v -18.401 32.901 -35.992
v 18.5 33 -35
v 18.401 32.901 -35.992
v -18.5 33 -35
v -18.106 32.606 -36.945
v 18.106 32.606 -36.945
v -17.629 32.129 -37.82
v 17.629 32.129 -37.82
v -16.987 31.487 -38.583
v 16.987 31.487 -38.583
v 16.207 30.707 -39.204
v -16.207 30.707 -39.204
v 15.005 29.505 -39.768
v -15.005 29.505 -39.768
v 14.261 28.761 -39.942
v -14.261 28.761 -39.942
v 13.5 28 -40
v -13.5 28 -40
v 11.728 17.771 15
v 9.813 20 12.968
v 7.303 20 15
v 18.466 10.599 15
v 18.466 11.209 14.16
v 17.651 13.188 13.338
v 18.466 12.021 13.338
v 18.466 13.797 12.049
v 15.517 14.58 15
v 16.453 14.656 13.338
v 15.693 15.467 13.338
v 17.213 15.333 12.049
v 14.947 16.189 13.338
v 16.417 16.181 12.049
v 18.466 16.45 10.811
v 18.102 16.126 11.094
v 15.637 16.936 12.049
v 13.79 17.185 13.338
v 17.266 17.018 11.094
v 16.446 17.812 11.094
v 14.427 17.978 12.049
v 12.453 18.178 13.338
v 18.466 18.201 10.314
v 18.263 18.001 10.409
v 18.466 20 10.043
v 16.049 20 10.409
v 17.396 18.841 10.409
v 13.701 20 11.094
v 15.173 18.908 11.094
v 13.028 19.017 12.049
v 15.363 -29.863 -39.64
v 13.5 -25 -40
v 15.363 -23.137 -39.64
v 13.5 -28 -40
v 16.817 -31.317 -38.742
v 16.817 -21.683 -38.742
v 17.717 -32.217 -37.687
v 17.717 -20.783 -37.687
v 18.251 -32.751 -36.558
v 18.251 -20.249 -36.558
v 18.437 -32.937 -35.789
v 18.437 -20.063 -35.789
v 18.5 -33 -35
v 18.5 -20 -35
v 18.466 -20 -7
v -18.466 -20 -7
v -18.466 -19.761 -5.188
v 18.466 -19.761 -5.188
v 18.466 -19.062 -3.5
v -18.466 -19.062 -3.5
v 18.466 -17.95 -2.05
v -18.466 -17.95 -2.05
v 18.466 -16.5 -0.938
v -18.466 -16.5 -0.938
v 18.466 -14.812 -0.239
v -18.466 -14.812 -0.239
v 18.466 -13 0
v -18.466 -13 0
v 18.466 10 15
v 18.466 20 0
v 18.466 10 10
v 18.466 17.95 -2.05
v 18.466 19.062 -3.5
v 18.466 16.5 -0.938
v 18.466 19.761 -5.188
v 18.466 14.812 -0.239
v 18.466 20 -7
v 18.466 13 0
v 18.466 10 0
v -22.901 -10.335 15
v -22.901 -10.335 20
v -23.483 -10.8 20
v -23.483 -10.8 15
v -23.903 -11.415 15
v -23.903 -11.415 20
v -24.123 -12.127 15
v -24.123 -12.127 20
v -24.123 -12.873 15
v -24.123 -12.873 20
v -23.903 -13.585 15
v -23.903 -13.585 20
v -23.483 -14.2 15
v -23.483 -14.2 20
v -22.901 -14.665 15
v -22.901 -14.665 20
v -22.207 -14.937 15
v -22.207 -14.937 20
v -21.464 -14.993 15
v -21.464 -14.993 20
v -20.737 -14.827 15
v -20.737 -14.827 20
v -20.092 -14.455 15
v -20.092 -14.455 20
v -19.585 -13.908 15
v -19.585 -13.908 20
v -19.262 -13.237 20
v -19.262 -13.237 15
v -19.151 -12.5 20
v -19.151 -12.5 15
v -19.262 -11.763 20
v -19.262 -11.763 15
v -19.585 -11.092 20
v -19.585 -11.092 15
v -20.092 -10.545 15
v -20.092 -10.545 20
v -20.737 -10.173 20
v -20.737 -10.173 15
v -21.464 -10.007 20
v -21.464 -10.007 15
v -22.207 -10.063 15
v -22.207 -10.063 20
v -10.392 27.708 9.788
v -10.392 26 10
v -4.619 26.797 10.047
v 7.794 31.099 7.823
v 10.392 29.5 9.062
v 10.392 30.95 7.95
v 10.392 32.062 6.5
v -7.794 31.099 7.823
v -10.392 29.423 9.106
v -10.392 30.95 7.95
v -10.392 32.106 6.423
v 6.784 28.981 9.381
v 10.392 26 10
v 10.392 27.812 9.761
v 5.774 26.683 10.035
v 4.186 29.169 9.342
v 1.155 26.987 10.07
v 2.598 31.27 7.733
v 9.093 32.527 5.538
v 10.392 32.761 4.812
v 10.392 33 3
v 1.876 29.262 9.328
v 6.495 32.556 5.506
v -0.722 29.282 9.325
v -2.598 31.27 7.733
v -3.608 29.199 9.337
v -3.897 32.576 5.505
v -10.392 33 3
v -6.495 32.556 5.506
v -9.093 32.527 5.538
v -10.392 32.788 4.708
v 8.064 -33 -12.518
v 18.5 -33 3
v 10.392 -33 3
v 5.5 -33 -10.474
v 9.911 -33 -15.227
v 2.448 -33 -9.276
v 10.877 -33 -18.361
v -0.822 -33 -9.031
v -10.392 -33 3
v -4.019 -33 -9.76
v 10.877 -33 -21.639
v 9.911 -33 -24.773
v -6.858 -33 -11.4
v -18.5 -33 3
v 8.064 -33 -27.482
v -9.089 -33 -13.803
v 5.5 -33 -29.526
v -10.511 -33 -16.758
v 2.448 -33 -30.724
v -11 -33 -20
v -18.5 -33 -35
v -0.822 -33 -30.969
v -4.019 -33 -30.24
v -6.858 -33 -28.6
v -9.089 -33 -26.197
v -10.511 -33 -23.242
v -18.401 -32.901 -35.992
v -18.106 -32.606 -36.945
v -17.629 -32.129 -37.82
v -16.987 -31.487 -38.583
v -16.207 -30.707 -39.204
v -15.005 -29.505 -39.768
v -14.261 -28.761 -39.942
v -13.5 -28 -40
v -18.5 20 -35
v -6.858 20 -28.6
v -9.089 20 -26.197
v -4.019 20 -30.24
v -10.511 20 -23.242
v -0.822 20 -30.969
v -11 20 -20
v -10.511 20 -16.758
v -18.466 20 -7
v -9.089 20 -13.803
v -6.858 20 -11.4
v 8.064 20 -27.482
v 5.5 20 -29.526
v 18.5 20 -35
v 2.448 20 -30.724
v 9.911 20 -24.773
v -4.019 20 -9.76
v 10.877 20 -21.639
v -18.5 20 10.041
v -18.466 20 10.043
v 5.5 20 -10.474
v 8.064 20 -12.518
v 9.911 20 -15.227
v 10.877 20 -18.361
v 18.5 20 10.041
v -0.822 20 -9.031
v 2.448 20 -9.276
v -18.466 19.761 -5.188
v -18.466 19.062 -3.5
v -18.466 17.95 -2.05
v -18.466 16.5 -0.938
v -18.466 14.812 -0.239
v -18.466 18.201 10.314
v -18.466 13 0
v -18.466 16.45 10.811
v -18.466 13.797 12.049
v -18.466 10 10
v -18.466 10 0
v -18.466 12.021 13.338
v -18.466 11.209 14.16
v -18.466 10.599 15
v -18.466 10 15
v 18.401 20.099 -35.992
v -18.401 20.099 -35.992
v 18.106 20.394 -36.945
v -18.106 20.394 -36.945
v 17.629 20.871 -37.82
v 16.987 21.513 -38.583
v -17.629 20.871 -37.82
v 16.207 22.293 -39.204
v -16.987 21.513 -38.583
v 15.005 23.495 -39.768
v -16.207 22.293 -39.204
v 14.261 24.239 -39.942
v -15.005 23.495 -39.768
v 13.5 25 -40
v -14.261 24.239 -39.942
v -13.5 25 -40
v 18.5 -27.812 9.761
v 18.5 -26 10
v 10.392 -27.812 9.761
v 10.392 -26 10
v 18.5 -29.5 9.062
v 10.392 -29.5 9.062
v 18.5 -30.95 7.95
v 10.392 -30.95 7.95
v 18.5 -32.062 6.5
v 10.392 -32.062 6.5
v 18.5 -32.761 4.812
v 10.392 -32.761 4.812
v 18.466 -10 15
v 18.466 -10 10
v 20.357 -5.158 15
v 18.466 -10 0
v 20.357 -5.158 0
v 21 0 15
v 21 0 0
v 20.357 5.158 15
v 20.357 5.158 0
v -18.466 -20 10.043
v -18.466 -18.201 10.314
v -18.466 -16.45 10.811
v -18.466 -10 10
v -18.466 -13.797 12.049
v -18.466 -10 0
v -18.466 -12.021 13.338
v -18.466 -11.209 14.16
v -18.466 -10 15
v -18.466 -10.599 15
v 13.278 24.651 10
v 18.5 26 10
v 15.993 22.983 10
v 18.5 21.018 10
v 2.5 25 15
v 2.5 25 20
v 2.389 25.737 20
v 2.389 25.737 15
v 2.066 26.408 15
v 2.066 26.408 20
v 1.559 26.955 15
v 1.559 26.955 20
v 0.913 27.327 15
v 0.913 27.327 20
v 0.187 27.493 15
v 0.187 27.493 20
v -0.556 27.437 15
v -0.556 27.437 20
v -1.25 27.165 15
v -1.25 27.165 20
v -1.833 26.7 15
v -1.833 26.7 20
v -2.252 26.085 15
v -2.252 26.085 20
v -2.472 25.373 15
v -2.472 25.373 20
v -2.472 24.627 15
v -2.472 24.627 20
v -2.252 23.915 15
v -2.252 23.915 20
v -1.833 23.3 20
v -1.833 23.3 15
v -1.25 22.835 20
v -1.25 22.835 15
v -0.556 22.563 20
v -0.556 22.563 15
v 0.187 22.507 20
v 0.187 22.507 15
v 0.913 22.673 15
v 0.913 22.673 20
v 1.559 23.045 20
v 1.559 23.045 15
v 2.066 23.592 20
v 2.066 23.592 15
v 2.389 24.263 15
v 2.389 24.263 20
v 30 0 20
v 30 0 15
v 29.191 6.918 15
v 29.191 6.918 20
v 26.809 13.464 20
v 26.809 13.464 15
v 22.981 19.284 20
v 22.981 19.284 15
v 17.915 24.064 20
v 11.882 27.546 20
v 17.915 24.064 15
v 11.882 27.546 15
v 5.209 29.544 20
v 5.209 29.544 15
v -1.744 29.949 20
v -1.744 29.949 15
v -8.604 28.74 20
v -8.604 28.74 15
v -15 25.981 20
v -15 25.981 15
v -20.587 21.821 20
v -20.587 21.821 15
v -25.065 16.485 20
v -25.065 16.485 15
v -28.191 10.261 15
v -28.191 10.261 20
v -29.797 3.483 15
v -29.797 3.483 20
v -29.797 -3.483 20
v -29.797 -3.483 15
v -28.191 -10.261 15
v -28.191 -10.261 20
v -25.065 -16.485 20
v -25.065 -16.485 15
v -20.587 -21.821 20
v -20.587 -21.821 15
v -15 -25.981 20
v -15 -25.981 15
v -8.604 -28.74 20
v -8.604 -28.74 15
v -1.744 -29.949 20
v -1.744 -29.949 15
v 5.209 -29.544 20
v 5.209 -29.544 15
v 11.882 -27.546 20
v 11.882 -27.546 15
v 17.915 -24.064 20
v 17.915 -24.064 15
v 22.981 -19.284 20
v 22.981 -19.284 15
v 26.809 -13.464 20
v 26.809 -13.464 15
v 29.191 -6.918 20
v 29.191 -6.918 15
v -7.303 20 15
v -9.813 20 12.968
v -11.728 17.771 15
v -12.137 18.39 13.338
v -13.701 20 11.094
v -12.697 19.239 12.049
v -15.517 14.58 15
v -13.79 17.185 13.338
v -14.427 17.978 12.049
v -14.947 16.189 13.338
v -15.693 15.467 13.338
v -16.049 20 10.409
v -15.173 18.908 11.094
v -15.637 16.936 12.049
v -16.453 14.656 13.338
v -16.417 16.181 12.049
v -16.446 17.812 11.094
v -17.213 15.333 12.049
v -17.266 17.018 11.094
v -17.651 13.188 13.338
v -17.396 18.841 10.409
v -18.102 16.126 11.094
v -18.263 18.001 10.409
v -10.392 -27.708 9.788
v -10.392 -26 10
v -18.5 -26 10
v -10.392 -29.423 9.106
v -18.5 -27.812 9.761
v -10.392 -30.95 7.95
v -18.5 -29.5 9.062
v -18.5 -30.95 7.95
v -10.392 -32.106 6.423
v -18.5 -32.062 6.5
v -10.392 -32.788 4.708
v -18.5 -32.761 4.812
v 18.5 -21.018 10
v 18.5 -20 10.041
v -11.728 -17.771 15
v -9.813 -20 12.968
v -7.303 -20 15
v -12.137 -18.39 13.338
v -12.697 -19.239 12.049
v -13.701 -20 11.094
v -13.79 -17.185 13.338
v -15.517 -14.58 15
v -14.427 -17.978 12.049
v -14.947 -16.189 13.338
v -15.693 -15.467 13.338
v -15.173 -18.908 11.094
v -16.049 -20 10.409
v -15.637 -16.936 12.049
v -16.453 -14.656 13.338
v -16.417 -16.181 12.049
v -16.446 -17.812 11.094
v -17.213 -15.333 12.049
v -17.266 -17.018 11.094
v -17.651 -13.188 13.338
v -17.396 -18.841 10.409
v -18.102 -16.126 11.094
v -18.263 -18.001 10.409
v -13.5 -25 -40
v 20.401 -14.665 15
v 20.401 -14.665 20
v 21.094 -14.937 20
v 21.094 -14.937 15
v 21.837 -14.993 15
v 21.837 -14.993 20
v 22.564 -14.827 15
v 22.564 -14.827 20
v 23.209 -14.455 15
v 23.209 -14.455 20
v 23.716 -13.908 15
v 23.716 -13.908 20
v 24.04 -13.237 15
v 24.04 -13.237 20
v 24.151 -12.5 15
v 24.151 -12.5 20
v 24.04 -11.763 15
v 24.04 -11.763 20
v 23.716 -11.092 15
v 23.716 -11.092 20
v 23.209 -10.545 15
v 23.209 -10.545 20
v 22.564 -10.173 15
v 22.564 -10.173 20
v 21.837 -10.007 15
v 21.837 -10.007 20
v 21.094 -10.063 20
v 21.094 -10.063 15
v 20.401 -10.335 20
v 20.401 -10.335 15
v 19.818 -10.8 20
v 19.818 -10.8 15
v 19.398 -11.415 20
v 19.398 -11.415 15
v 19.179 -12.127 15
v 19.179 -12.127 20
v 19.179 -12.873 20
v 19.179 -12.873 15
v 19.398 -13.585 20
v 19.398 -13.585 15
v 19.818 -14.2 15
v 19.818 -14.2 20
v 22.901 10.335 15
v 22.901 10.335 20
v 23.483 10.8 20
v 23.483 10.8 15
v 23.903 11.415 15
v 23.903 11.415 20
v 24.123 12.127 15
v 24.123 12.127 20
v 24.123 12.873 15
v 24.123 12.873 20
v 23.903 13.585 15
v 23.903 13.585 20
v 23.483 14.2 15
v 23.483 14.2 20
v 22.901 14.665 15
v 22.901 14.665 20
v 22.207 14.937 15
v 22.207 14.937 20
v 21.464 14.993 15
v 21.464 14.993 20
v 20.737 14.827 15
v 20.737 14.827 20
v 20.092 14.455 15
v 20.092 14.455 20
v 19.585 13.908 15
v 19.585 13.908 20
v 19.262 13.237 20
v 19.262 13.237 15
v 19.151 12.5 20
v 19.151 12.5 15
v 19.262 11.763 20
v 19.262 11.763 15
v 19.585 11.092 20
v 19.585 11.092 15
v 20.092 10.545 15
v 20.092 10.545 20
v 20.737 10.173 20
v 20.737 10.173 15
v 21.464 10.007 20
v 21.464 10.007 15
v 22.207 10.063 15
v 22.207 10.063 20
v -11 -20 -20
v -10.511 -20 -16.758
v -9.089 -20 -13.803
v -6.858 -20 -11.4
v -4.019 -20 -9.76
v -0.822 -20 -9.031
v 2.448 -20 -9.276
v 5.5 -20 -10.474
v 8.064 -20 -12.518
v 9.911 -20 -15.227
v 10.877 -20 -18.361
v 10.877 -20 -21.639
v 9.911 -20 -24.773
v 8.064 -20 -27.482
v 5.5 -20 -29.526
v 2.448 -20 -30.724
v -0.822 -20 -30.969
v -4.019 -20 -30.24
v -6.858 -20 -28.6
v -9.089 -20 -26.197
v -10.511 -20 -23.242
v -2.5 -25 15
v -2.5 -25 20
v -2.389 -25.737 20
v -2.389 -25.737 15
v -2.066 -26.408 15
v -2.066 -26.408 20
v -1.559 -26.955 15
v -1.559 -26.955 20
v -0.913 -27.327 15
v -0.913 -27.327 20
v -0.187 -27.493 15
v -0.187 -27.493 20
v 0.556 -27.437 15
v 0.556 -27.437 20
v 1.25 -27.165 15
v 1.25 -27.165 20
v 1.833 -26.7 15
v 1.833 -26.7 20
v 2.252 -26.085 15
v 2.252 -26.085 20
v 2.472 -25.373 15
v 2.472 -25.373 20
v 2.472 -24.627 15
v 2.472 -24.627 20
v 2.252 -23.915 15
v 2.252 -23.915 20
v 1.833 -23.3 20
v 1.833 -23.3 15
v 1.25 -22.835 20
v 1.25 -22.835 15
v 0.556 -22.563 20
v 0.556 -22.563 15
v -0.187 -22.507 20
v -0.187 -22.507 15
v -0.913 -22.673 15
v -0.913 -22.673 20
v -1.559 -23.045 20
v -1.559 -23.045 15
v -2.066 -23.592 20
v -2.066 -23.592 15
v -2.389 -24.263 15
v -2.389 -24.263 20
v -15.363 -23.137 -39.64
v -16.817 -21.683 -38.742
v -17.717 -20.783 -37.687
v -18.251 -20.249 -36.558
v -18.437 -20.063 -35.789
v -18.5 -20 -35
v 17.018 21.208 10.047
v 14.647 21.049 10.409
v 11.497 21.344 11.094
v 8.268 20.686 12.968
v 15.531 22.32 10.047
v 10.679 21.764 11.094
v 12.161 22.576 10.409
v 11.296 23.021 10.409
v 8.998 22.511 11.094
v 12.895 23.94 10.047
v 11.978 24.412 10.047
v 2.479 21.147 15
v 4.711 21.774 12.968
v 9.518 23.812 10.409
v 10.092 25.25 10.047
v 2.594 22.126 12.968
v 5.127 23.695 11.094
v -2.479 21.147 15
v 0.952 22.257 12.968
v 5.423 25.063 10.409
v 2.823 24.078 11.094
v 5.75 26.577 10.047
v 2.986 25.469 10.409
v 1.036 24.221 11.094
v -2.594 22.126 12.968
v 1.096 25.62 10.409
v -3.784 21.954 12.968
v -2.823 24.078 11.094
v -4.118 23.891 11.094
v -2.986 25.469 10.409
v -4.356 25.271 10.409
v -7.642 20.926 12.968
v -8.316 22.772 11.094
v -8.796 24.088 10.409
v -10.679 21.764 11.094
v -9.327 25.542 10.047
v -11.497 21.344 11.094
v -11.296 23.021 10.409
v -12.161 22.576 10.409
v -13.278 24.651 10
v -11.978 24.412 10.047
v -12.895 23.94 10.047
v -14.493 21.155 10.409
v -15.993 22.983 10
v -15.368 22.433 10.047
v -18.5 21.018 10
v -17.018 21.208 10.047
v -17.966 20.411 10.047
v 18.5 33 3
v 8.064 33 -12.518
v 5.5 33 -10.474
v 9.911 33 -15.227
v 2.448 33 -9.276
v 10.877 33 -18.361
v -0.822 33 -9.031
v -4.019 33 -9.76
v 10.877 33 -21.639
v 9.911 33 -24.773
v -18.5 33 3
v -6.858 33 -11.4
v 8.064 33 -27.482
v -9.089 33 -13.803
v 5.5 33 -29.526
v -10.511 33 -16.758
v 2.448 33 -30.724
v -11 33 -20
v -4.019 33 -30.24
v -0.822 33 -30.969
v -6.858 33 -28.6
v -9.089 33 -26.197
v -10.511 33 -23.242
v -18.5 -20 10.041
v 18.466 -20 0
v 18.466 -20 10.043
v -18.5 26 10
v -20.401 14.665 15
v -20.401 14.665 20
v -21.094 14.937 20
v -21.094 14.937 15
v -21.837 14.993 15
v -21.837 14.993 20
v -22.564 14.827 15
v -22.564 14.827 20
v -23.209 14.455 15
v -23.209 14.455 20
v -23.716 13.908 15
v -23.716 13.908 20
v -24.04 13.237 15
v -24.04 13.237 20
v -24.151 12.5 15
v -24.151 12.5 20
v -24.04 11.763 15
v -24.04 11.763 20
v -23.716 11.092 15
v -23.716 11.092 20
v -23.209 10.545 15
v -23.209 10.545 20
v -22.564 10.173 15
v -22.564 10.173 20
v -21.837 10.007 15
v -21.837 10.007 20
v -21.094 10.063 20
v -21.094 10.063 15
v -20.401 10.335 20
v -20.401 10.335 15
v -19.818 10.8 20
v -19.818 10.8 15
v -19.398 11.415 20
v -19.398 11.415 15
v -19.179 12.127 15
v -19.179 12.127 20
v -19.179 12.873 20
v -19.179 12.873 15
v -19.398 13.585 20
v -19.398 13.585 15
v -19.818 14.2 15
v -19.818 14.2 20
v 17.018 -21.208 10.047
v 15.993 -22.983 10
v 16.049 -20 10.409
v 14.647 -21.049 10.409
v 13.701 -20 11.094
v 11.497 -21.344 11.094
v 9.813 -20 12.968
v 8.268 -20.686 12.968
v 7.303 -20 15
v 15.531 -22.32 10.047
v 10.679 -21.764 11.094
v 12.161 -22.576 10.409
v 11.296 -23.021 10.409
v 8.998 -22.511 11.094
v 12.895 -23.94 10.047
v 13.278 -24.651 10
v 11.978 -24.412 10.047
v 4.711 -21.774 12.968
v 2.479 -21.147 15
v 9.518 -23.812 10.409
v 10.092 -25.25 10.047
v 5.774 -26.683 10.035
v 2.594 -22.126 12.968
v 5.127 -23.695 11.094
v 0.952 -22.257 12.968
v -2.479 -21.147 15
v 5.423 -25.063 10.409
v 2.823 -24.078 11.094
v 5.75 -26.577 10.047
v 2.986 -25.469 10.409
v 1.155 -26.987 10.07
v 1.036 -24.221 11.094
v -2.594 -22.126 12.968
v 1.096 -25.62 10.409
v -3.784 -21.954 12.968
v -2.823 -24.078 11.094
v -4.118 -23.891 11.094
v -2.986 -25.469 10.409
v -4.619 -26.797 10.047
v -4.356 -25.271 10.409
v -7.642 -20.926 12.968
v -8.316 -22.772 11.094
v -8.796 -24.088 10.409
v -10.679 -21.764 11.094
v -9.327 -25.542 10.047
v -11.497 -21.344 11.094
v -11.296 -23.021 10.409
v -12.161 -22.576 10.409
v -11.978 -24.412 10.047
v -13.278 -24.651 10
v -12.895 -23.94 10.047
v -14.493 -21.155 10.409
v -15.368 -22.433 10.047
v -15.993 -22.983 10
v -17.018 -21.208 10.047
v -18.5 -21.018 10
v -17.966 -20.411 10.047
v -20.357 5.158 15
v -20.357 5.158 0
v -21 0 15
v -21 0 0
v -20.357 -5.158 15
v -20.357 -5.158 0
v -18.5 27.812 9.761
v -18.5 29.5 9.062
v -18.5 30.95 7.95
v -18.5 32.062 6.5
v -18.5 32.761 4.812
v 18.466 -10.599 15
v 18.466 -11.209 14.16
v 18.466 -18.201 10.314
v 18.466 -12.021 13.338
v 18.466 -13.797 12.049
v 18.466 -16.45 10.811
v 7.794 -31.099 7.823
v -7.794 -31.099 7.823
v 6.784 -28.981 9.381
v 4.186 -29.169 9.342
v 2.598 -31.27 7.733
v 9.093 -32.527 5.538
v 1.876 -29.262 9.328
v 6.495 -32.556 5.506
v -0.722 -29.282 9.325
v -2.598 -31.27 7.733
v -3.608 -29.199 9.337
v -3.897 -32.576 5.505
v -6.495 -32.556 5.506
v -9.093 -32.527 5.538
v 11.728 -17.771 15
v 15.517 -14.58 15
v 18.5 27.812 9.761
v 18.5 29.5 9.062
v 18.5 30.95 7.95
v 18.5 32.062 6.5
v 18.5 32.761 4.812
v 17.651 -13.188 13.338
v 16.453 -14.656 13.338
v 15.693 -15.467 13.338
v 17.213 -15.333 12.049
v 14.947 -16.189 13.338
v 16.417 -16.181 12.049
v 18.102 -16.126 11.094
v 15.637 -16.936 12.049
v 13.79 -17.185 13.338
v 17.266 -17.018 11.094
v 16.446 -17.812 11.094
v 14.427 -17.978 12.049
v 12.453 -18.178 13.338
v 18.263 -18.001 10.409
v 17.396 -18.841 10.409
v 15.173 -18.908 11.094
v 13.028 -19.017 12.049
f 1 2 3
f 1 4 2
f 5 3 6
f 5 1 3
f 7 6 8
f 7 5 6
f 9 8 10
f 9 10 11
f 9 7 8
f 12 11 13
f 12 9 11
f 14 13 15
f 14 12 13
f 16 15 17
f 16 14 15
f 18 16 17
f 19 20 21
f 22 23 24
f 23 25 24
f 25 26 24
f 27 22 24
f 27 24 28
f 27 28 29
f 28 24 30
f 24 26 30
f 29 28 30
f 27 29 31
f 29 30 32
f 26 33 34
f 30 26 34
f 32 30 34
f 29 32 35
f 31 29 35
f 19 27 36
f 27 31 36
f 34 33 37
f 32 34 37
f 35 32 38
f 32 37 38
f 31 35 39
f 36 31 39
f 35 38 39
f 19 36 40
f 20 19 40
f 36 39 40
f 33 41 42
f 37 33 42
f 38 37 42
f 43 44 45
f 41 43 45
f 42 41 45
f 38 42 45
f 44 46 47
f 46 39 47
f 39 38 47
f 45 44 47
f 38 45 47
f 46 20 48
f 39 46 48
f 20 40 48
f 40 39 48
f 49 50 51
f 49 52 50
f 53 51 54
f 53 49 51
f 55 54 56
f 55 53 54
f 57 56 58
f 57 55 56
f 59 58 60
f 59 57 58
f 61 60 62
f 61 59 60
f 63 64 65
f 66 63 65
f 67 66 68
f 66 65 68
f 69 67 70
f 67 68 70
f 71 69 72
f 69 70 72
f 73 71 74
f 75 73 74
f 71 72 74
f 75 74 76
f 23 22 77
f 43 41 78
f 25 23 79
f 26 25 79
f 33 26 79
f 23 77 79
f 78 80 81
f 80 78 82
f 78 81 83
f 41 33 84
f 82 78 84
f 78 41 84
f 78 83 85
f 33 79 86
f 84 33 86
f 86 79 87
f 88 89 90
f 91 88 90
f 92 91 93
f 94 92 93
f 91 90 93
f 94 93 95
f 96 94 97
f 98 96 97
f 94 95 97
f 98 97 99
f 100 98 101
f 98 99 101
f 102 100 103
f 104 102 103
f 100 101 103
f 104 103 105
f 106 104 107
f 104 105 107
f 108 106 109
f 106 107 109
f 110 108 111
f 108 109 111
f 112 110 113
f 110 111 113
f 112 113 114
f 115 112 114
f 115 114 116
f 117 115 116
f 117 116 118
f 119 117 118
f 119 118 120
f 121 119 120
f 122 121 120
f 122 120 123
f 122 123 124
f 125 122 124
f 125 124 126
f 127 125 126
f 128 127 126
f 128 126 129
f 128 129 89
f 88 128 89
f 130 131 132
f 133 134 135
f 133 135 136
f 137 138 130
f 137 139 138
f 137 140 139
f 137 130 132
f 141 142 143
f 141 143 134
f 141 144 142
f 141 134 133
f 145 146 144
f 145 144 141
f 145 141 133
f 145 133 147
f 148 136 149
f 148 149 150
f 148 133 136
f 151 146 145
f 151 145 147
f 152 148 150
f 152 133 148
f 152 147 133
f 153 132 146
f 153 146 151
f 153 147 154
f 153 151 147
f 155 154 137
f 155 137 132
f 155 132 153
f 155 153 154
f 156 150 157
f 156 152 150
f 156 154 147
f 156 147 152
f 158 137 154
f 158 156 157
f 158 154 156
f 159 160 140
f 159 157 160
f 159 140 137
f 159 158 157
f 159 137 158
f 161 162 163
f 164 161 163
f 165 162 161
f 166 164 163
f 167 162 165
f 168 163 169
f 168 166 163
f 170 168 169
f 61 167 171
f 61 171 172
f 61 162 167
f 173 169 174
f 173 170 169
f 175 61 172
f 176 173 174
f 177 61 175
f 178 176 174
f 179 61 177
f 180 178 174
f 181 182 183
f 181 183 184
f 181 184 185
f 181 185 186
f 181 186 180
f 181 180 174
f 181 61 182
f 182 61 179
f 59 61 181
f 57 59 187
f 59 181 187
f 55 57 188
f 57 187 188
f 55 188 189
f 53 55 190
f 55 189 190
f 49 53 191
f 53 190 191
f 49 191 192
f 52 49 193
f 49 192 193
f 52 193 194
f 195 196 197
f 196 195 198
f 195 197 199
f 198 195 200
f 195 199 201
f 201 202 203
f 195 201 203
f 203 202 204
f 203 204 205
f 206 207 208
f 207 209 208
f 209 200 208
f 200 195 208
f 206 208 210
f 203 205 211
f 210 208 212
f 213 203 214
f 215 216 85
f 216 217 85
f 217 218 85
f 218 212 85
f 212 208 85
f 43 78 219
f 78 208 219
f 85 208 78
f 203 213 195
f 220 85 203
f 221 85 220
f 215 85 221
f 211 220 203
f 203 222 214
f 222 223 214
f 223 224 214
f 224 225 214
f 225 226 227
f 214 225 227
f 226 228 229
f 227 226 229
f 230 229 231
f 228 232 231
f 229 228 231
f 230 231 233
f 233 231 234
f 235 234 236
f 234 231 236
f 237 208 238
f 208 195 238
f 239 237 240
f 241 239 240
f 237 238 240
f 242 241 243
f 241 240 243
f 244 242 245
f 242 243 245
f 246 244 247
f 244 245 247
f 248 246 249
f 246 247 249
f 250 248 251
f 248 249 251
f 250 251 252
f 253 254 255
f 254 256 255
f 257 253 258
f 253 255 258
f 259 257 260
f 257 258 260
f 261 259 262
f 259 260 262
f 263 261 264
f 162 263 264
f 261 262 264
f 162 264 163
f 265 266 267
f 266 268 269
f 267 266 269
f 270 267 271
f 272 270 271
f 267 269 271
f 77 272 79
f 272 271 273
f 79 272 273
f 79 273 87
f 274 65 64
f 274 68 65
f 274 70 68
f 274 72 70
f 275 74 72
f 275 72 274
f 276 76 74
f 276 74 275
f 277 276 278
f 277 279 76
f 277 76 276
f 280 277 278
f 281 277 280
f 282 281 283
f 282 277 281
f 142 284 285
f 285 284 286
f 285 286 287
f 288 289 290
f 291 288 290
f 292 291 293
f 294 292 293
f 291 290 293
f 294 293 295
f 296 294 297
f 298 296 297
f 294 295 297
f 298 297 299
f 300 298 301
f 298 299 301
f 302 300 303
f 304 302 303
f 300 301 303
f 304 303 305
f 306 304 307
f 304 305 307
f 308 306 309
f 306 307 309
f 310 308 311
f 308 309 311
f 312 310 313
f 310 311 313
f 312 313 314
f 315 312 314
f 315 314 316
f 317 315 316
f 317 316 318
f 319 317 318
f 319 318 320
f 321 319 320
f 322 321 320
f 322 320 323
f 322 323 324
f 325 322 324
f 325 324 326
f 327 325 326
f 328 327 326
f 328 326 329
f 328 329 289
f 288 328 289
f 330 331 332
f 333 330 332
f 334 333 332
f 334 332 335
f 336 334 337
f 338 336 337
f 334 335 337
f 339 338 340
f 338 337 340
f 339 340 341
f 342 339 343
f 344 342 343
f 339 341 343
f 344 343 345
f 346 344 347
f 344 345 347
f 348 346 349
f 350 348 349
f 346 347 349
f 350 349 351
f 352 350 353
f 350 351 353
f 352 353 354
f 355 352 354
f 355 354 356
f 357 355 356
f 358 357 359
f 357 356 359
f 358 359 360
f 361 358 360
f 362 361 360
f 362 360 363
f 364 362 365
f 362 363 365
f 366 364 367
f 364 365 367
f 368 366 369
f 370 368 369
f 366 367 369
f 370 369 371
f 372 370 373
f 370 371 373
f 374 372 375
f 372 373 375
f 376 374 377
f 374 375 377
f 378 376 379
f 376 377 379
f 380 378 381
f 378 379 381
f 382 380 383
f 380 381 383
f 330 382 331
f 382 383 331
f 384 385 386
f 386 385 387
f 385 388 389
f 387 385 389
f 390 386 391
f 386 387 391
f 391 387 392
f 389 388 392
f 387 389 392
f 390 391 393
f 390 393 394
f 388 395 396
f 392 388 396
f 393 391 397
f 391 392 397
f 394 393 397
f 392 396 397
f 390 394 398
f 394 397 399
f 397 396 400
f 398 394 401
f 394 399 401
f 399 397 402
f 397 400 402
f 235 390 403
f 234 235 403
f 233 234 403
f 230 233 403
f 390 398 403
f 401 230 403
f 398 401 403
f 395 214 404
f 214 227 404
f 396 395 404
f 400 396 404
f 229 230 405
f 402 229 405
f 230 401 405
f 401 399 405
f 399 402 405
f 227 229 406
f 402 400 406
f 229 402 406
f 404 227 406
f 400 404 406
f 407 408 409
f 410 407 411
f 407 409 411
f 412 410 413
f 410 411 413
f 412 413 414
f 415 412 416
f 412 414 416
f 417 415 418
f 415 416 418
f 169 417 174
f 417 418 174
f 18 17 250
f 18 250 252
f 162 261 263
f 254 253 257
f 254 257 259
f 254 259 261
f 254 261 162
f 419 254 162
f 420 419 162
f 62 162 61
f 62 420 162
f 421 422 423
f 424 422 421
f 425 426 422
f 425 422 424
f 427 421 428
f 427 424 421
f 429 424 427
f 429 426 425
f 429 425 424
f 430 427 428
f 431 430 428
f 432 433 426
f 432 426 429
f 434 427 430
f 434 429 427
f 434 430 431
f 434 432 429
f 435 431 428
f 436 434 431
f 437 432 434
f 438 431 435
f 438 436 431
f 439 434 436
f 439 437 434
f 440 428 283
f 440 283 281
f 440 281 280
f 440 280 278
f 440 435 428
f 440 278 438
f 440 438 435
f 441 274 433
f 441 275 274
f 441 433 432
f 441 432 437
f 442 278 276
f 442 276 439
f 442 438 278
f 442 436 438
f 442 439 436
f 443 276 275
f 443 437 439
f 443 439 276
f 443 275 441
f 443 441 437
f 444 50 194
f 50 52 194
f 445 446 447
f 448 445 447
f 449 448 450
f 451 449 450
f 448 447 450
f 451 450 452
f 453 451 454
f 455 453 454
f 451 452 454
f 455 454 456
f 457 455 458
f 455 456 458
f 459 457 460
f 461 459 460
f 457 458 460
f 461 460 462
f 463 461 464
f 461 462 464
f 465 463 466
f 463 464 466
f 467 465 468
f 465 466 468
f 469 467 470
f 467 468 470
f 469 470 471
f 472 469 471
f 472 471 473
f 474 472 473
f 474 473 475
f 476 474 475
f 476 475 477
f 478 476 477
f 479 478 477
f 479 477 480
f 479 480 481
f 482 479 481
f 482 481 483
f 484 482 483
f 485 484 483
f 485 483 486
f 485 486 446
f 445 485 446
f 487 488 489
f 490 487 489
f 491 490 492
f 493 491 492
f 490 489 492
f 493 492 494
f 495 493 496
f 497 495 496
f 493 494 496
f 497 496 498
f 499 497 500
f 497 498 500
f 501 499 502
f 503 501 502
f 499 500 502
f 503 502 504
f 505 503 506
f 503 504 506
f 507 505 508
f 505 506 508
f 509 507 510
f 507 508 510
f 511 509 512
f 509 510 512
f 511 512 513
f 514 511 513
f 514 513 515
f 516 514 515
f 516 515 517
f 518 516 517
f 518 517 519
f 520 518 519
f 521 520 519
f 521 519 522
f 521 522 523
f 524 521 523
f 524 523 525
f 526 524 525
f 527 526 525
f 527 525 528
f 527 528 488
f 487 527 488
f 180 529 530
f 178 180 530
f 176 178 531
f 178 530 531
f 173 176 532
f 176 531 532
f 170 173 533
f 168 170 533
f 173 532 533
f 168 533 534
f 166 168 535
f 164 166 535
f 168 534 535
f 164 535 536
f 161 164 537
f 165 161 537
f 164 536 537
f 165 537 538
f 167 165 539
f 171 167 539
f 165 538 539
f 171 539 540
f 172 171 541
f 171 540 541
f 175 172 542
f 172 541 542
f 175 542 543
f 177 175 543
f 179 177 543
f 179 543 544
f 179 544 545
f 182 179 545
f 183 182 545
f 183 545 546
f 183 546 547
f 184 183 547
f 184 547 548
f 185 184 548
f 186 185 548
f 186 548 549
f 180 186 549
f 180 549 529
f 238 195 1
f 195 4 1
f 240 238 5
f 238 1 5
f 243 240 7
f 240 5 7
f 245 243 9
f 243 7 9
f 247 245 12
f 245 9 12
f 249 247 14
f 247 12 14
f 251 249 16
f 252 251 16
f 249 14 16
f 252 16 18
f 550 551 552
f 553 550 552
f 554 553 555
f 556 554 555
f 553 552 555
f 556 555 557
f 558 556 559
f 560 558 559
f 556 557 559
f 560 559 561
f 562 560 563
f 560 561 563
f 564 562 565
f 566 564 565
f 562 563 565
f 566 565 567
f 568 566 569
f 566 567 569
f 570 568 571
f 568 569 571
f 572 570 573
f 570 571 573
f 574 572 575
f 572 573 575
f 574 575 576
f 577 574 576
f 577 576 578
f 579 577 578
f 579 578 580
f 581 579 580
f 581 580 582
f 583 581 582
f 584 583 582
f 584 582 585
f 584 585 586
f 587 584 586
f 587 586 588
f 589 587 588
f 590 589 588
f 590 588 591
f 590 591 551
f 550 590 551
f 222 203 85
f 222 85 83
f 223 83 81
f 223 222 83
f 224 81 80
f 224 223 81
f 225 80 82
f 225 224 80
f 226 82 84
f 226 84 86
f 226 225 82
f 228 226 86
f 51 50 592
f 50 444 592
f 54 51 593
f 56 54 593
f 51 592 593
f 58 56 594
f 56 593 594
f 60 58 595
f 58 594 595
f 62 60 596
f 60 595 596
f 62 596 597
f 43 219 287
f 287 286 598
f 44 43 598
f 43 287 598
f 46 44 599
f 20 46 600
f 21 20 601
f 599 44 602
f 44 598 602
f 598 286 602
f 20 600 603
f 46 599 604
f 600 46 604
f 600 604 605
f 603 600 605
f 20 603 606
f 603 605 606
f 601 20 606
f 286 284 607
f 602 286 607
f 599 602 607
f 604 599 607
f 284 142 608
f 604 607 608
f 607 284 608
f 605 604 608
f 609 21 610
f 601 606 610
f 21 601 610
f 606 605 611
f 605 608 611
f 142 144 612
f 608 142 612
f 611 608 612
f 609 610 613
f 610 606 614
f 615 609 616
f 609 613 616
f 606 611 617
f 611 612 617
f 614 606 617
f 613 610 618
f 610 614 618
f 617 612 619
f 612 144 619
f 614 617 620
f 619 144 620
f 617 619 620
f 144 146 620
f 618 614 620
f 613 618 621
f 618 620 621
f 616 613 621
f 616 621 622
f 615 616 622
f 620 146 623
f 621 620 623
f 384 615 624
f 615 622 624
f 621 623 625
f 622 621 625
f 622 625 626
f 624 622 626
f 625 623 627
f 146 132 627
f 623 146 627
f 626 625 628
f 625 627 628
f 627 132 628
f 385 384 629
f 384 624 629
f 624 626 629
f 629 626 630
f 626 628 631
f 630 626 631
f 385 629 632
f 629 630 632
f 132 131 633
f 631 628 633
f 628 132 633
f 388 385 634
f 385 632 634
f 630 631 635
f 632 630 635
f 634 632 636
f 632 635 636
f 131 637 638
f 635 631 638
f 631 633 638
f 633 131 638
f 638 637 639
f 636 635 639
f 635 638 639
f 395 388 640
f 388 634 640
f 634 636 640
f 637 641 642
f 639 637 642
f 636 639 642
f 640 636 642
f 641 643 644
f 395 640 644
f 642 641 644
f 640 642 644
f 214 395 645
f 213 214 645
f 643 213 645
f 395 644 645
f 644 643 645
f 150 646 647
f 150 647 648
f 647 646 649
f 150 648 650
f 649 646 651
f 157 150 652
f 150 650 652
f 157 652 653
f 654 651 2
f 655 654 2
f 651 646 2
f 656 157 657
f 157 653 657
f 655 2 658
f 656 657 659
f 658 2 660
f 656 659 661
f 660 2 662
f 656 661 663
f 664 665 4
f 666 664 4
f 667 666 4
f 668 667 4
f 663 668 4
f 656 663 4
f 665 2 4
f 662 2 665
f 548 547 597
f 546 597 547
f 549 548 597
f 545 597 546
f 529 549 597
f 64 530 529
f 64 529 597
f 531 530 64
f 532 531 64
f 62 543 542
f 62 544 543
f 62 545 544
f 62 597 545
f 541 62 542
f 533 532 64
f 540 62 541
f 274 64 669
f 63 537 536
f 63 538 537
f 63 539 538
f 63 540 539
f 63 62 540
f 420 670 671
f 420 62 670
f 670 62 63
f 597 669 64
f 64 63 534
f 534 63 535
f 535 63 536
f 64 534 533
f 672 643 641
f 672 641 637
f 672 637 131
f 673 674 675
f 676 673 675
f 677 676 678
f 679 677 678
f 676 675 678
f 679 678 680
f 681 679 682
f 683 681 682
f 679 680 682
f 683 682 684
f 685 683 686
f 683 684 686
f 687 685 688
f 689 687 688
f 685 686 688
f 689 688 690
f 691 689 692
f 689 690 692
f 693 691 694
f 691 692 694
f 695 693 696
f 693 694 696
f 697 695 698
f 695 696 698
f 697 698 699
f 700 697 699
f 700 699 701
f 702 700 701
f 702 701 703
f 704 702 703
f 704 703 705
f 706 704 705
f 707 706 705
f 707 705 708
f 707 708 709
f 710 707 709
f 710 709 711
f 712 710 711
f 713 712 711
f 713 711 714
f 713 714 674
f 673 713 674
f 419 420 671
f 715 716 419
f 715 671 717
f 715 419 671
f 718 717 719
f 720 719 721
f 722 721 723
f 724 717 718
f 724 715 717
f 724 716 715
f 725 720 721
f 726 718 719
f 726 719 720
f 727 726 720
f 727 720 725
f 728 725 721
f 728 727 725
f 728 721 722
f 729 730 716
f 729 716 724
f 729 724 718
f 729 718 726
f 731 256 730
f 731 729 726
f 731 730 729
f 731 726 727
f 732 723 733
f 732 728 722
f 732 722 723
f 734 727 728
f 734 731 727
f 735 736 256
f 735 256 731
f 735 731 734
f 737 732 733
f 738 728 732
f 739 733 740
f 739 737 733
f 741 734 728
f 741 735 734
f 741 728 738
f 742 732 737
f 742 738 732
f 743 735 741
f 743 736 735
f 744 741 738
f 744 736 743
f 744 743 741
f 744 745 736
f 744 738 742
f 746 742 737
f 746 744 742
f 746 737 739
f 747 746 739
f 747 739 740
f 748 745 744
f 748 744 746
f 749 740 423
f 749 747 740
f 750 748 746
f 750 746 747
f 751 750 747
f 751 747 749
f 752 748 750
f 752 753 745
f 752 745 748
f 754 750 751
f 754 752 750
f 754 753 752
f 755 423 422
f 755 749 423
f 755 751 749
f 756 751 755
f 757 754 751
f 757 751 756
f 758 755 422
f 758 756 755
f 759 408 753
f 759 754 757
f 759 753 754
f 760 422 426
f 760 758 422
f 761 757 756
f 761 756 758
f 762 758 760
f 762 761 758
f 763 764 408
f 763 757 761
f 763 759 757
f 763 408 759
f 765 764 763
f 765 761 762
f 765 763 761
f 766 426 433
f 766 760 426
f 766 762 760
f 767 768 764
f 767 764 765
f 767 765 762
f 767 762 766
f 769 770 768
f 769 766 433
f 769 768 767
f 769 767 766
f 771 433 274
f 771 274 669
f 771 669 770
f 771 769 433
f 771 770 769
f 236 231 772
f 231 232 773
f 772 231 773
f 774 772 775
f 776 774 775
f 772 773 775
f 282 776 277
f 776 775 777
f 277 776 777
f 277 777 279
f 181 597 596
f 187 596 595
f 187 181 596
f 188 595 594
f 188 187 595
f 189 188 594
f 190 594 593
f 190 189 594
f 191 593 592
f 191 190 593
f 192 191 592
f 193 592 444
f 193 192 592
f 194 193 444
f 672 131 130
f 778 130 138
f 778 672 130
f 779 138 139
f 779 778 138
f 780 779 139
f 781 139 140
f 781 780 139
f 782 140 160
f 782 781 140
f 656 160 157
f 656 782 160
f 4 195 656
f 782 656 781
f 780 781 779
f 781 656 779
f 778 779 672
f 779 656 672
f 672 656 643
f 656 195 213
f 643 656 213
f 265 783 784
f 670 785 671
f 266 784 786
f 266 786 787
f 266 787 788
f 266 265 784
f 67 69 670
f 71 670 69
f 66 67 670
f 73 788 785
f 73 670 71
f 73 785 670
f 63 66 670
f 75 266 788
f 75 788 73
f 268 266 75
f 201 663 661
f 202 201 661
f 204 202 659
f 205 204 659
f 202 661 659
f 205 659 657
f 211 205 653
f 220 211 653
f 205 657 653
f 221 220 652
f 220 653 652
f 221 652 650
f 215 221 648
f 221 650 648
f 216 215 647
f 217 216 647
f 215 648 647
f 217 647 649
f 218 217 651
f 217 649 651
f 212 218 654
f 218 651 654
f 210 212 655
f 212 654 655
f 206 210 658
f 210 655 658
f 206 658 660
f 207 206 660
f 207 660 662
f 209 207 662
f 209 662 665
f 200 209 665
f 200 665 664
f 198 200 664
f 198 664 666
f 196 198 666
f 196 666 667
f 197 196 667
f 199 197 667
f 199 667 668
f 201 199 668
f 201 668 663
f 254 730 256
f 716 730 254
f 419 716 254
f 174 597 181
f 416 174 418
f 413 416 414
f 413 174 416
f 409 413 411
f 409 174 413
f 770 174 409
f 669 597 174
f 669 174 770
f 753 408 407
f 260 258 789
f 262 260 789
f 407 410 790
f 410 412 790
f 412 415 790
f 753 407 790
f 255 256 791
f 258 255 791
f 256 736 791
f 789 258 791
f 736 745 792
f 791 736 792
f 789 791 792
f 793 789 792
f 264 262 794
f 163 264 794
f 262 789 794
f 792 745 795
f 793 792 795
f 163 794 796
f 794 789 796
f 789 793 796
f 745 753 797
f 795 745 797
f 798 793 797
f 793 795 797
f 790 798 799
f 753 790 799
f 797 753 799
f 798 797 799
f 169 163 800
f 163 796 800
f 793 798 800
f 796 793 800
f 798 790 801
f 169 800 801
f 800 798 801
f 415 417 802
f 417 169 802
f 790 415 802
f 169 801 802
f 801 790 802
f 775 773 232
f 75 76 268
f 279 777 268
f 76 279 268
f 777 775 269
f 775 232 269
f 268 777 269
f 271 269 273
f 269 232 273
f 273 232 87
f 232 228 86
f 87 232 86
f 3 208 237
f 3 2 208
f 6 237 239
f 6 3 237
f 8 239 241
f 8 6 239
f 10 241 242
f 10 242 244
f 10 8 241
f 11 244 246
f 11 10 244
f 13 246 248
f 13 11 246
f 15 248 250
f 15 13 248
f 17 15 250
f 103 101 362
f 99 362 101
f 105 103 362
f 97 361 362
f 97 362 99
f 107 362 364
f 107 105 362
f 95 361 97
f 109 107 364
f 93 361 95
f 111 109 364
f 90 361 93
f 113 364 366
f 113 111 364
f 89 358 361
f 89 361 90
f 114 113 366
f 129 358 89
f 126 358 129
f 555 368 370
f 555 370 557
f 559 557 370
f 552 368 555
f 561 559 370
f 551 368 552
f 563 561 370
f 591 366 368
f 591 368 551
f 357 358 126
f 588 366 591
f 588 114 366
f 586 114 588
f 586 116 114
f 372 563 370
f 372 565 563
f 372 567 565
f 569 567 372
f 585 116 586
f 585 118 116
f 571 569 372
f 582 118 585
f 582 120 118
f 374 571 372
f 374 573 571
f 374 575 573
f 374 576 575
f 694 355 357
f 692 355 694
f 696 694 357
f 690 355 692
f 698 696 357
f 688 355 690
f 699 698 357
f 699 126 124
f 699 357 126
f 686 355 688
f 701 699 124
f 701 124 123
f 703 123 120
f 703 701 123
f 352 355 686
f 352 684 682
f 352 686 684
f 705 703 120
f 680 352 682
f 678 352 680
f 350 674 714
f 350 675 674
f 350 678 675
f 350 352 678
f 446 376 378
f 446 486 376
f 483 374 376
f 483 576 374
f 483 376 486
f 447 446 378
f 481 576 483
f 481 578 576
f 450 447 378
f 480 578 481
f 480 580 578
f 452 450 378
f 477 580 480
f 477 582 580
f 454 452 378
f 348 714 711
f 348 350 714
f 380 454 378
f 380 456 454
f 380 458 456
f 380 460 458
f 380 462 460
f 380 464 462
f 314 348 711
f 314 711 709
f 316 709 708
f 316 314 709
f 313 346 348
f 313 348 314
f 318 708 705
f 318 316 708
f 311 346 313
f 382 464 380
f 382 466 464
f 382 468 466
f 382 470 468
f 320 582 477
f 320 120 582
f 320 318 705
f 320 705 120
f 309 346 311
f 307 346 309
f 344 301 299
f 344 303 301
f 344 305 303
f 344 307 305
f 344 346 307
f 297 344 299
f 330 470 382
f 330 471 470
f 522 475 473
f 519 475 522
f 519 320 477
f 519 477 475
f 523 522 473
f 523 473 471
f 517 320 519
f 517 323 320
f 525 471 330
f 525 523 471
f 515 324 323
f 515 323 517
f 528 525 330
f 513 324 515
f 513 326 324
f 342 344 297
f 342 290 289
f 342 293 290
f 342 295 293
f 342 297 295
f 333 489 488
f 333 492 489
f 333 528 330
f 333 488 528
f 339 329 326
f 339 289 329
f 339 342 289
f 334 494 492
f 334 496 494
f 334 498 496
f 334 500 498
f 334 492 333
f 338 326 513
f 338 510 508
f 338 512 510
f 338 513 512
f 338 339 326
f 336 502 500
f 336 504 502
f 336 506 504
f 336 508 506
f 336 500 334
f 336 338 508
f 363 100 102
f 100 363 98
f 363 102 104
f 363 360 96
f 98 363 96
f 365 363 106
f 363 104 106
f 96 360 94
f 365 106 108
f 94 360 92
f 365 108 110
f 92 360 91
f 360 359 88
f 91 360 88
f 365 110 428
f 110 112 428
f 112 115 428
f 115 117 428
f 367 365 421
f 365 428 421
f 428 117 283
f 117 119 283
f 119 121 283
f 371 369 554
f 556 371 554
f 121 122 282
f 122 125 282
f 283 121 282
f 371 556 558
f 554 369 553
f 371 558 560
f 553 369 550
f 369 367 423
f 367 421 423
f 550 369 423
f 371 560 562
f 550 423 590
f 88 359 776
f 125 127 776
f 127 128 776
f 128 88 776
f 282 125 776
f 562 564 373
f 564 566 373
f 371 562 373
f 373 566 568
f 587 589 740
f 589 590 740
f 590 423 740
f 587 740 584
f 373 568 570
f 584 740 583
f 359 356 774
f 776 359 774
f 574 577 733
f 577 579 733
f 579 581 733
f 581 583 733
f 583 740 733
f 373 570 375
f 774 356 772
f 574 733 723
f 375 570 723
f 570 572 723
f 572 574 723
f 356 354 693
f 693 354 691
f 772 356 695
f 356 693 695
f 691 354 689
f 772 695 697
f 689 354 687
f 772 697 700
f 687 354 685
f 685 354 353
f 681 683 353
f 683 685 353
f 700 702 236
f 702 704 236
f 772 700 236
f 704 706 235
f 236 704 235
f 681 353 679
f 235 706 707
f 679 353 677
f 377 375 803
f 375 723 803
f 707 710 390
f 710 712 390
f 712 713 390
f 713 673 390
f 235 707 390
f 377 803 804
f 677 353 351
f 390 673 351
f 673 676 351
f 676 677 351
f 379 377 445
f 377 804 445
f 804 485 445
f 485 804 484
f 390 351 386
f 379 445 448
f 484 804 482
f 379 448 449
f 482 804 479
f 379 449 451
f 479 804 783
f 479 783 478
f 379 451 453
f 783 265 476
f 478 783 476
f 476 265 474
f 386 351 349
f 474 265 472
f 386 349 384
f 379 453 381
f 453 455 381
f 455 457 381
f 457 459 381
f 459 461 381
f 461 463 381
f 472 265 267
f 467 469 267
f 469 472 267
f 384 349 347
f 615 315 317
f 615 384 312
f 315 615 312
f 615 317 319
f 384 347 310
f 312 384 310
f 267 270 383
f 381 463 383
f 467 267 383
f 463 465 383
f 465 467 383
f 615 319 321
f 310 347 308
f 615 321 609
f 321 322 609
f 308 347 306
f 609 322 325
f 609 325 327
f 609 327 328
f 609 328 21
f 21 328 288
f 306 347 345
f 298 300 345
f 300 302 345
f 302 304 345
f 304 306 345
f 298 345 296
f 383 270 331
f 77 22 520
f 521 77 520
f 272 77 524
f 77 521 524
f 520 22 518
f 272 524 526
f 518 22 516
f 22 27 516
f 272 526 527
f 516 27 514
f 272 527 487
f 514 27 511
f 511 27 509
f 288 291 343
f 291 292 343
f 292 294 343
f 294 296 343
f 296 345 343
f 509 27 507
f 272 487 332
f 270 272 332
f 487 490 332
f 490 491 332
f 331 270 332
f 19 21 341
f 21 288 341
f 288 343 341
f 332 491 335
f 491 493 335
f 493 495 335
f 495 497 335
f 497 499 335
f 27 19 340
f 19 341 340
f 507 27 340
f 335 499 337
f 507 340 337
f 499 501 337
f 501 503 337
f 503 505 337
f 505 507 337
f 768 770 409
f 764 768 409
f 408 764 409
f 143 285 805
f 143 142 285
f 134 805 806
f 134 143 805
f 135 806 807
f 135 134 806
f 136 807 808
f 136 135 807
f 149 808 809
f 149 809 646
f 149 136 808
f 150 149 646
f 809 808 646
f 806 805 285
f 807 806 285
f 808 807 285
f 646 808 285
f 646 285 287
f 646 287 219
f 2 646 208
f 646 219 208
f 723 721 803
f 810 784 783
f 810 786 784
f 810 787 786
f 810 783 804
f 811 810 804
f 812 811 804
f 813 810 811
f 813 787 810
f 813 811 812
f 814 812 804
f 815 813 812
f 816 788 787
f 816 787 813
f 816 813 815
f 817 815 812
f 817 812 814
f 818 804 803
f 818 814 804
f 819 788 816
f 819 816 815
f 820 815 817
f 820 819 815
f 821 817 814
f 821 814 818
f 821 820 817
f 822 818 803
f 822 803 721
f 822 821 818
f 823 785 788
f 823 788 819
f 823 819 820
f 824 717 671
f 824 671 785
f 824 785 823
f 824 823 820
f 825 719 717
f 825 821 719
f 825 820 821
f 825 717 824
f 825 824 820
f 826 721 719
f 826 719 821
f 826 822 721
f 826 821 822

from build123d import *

# Parameters (mm, degrees)
SZKIC1_R                    = 21
DODANIE_WYCI_GNI_CIE1_DEPTH = 15
SZKIC6_R                    = 30
DODANIE_WYCI_GNI_CIE3_DEPTH = 5
SZKIC7_R                    = 2.5
WYTNIJ_WYCI_GNI_CIE2_DEPTH  = 5
SZYK_KO_OWY1_COUNT          = 6
SZKIC8_W                    = 37
SZKIC8_H                    = 13
DODANIE_WYCI_GNI_CIE4_DEPTH = 50
SZKIC9_W                    = 36.932370626
SZKIC9_H                    = 10
DODANIE_WYCI_GNI_CIE5_DEPTH = 10
ZAOKR_GLENIE1_R             = 7
ZAOKR_GLENIE2_R             = 7
SZKIC10_R                   = 11
WYTNIJ_WYCI_GNI_CIE3_DEPTH  = 83.800966306
ZAOKR_GLENIE3_R             = 5


# Read off the part's stored shape, not the designer's step: Lustro1
with BuildPart() as part:
    # Szkic1 → Dodanie-wyciągnięcie1 (new body)
    with BuildSketch(Plane.XY):
        Circle(SZKIC1_R)
    extrude(amount=DODANIE_WYCI_GNI_CIE1_DEPTH)

    # Szkic6 → Dodanie-wyciągnięcie3 (add)
    with BuildSketch(Plane.XY.offset(15)):
        Circle(SZKIC6_R)
    extrude(amount=DODANIE_WYCI_GNI_CIE3_DEPTH)

    # Szkic7 → Wytnij-wyciągnięcie2 (cut)
    with BuildSketch(Plane.XY.offset(20)):
        with Locations((0, 25)):
            Circle(SZKIC7_R)
    wytnij_wyci_gni_cie2 = extrude(amount=-WYTNIJ_WYCI_GNI_CIE2_DEPTH, mode=Mode.SUBTRACT)

    # Szyk kołowy1: Wytnij-wyciągnięcie2 ×6 about axis
    szyk_ko_owy1_axis = Axis((0, 0, 0), (0, 0, 1))
    for i in range(1, SZYK_KO_OWY1_COUNT):
        add(wytnij_wyci_gni_cie2.rotate(szyk_ko_owy1_axis, i * 360 / SZYK_KO_OWY1_COUNT), mode=Mode.SUBTRACT)

    # Szkic8 → Dodanie-wyciągnięcie4 (add)
    with BuildSketch(Plane(origin=(0, 0, -40), x_dir=(-1, 0, 0), z_dir=(0, 0, -1))):
        with Locations((0, 26.5)):
            Rectangle(SZKIC8_W, SZKIC8_H)
    extrude(amount=-DODANIE_WYCI_GNI_CIE4_DEPTH)

    # Szkic9 → Dodanie-wyciągnięcie5 (add)
    with BuildSketch(Plane(origin=(0, 10, 0), x_dir=(1, 0, 0), z_dir=(0, 1, 0))):
        with Locations((0, -5)):
            Rectangle(SZKIC9_W, SZKIC9_H)
    extrude(amount=DODANIE_WYCI_GNI_CIE5_DEPTH)

    # Zaokrąglenie1
    # the kernel refuses this fillet: 7 mm, written as the material it adds along each edge
    with BuildSketch(Plane(origin=(-18.466185313, 20, 0), x_dir=(0, 0, -1), z_dir=(1, 0, 0))) as zaokr_glenie1_piece_1:
        with BuildLine():
            CenterArc((ZAOKR_GLENIE1_R, -ZAOKR_GLENIE1_R), ZAOKR_GLENIE1_R, 90, 90)
            Line((0, -ZAOKR_GLENIE1_R), (0, 0))
            Line((0, 0), (ZAOKR_GLENIE1_R, 0))
        make_face()
    extrude(amount=36.932370625)
    with BuildSketch(Plane(origin=(0, 0, 10), x_dir=(0.9435381877974668, -0.33126377430662773, 0), z_dir=(-0.33126377430662773, -0.9435381877974668, 0))) as zaokr_glenie1_piece_2_section:
        with BuildLine():
            CenterArc((21 + ZAOKR_GLENIE1_R, ZAOKR_GLENIE1_R), ZAOKR_GLENIE1_R, 180, 90)
            Line((21 + ZAOKR_GLENIE1_R, 0), (21, 0))
            Line((21, 0), (21, ZAOKR_GLENIE1_R))
        make_face()
    zaokr_glenie1_piece_2 = revolve(axis=Axis((0, 0, 10), (0, 0, 1)), revolution_arc=218.690998802, mode=Mode.PRIVATE)
    zaokr_glenie1_piece_2 = split(zaokr_glenie1_piece_2, bisect_by=Plane(origin=(18.482842321, 20, 10.012675599), z_dir=(0, 1, 0)), keep=Keep.TOP, mode=Mode.PRIVATE)
    zaokr_glenie1_piece_2 = split(zaokr_glenie1_piece_2, bisect_by=Plane(origin=(18.5, 20.258945845, 10.012675599), z_dir=(-1, 0, 0)), keep=Keep.TOP, mode=Mode.PRIVATE)
    zaokr_glenie1_piece_2 = split(zaokr_glenie1_piece_2, bisect_by=Plane(origin=(-18.5, 20.258945845, 10.012675599), z_dir=(1, 0, 0)), keep=Keep.TOP, mode=Mode.PRIVATE)
    add(zaokr_glenie1_piece_2)
    with BuildSketch(Plane(origin=(0, 0, 10), x_dir=(0.9435381877974668, -0.33126377430662773, 0), z_dir=(-0.33126377430662773, -0.9435381877974668, 0))) as zaokr_glenie1_piece_3_section:
        with BuildLine():
            CenterArc((21 + ZAOKR_GLENIE1_R, ZAOKR_GLENIE1_R), ZAOKR_GLENIE1_R, 180, 90)
            Line((21 + ZAOKR_GLENIE1_R, 0), (21, 0))
            Line((21, 0), (21, ZAOKR_GLENIE1_R))
        make_face()
    zaokr_glenie1_piece_3 = revolve(axis=Axis((0, 0, 10), (0, 0, 1)), revolution_arc=218.690998802, mode=Mode.PRIVATE)
    zaokr_glenie1_piece_3 = split(zaokr_glenie1_piece_3, bisect_by=Plane(origin=(18.466185313, 16.543061686, 11.724606468), z_dir=(-1, 0, 0)), keep=Keep.TOP, mode=Mode.PRIVATE)
    zaokr_glenie1_piece_3 = split(zaokr_glenie1_piece_3, bisect_by=Plane(origin=(-18.466185313, 16.543061686, 11.724606468), z_dir=(1, 0, 0)), keep=Keep.TOP, mode=Mode.PRIVATE)
    add(zaokr_glenie1_piece_3)

    # Zaokrąglenie2
    zaokr_glenie2_edges = [part.edges().sort_by_distance(p)[0] for p in [
        (0, 33, 10),
    ]]
    fillet(zaokr_glenie2_edges, radius=ZAOKR_GLENIE2_R)

    # Lustro1: part across plane


with BuildPart() as part_1:
    add(part.part)
    add(part.part.mirror(Plane.ZX))

    # Szkic10 → Wytnij-wyciągnięcie3 (cut, through all)
    with BuildSketch(Plane(origin=(0, 33, 0), x_dir=(1, 0, 0), z_dir=(0, 1, 0))):
        with Locations(Location((0, 20, 0), (0, 0, 180))):
            Circle(SZKIC10_R)
    extrude(amount=-WYTNIJ_WYCI_GNI_CIE3_DEPTH, mode=Mode.SUBTRACT)

    # Zaokrąglenie3
    zaokr_glenie3_edges = [part_1.edges().sort_by_distance(p)[0] for p in [
        (0, -20, -40),
        (18.5, -26.5, -40),
        (0, -33, -40),
        (-18.5, -26.5, -40),
        (0, 33, -40),
        (-18.5, 26.5, -40),
        (18.5, 26.5, -40),
        (0, 20, -40),
    ]]
    fillet(zaokr_glenie3_edges, radius=ZAOKR_GLENIE3_R)


solid = part_1.part
